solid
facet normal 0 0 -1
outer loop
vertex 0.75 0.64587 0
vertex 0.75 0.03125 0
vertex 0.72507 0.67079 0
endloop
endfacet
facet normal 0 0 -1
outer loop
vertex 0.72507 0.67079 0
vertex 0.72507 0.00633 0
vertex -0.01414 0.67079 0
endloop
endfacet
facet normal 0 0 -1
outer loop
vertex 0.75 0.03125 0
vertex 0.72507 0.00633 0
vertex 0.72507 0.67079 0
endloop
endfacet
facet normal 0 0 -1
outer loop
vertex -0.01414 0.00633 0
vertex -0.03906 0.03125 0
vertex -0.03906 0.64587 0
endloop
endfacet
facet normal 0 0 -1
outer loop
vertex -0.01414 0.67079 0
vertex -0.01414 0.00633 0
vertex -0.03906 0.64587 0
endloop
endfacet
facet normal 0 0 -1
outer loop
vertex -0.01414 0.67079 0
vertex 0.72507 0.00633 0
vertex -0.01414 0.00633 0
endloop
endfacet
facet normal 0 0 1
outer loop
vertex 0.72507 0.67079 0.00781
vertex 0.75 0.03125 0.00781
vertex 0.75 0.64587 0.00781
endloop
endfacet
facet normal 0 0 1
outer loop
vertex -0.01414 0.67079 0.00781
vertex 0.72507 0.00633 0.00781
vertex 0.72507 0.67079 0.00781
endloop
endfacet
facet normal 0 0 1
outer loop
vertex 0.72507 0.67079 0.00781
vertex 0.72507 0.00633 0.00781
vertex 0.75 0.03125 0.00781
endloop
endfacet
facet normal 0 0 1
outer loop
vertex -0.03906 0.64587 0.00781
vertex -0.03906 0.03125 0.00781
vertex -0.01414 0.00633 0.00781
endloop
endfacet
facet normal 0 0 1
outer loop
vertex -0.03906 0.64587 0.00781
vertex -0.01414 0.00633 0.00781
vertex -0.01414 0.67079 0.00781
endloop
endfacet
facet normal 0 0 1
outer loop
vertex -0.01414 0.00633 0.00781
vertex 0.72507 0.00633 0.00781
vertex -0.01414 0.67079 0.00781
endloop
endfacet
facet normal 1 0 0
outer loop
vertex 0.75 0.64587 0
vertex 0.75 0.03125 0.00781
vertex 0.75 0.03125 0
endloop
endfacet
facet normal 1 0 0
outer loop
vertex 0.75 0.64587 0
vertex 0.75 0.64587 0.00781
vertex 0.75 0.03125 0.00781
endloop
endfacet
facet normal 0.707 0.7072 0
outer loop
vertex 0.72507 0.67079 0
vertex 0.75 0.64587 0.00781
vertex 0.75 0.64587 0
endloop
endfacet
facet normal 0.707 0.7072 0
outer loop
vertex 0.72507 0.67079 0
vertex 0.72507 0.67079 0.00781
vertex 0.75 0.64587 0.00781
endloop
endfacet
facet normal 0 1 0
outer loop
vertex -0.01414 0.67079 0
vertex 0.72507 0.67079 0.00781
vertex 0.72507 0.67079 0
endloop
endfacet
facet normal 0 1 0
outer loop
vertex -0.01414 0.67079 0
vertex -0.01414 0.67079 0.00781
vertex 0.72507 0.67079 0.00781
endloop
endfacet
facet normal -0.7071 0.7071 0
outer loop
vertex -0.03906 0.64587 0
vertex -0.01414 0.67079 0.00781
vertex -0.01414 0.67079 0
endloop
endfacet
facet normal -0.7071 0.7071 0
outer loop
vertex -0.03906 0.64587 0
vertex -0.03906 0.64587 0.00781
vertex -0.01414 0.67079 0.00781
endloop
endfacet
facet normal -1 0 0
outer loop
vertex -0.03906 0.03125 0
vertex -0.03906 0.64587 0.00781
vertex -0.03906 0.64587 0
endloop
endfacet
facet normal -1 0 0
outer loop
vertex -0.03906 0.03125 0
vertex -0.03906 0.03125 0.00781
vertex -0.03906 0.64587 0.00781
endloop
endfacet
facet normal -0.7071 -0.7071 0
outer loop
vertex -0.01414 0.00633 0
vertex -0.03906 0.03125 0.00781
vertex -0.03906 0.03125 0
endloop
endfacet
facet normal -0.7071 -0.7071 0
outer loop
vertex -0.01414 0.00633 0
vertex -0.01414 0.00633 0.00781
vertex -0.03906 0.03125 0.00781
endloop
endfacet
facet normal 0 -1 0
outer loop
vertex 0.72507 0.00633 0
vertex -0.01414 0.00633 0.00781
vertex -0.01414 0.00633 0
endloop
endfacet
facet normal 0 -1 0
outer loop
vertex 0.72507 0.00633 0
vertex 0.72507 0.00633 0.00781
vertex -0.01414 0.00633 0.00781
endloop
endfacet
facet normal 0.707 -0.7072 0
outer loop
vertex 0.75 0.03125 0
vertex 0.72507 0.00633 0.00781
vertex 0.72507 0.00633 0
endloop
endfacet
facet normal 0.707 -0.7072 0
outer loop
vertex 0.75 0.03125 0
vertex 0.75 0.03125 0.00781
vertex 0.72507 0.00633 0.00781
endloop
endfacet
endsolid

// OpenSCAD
EPS = 0.01;

translate([-0.0390625, 0.03125, 0])
linear_extrude(height=0.0078125)
    polygon(points=[
        [0.024917763157894735, -0.024917763157894735],
        [0.7641447368421053, -0.024917763157894735],
        [0.7890625, 0.0],
        [0.7890625, 0.6146381578947369],
        [0.7641447368421053, 0.6395559210526316],
        [0.024917763157894735, 0.6395559210526316],
        [0.0, 0.6146381578947369],
        [0.0, 0.0]
    ]);
